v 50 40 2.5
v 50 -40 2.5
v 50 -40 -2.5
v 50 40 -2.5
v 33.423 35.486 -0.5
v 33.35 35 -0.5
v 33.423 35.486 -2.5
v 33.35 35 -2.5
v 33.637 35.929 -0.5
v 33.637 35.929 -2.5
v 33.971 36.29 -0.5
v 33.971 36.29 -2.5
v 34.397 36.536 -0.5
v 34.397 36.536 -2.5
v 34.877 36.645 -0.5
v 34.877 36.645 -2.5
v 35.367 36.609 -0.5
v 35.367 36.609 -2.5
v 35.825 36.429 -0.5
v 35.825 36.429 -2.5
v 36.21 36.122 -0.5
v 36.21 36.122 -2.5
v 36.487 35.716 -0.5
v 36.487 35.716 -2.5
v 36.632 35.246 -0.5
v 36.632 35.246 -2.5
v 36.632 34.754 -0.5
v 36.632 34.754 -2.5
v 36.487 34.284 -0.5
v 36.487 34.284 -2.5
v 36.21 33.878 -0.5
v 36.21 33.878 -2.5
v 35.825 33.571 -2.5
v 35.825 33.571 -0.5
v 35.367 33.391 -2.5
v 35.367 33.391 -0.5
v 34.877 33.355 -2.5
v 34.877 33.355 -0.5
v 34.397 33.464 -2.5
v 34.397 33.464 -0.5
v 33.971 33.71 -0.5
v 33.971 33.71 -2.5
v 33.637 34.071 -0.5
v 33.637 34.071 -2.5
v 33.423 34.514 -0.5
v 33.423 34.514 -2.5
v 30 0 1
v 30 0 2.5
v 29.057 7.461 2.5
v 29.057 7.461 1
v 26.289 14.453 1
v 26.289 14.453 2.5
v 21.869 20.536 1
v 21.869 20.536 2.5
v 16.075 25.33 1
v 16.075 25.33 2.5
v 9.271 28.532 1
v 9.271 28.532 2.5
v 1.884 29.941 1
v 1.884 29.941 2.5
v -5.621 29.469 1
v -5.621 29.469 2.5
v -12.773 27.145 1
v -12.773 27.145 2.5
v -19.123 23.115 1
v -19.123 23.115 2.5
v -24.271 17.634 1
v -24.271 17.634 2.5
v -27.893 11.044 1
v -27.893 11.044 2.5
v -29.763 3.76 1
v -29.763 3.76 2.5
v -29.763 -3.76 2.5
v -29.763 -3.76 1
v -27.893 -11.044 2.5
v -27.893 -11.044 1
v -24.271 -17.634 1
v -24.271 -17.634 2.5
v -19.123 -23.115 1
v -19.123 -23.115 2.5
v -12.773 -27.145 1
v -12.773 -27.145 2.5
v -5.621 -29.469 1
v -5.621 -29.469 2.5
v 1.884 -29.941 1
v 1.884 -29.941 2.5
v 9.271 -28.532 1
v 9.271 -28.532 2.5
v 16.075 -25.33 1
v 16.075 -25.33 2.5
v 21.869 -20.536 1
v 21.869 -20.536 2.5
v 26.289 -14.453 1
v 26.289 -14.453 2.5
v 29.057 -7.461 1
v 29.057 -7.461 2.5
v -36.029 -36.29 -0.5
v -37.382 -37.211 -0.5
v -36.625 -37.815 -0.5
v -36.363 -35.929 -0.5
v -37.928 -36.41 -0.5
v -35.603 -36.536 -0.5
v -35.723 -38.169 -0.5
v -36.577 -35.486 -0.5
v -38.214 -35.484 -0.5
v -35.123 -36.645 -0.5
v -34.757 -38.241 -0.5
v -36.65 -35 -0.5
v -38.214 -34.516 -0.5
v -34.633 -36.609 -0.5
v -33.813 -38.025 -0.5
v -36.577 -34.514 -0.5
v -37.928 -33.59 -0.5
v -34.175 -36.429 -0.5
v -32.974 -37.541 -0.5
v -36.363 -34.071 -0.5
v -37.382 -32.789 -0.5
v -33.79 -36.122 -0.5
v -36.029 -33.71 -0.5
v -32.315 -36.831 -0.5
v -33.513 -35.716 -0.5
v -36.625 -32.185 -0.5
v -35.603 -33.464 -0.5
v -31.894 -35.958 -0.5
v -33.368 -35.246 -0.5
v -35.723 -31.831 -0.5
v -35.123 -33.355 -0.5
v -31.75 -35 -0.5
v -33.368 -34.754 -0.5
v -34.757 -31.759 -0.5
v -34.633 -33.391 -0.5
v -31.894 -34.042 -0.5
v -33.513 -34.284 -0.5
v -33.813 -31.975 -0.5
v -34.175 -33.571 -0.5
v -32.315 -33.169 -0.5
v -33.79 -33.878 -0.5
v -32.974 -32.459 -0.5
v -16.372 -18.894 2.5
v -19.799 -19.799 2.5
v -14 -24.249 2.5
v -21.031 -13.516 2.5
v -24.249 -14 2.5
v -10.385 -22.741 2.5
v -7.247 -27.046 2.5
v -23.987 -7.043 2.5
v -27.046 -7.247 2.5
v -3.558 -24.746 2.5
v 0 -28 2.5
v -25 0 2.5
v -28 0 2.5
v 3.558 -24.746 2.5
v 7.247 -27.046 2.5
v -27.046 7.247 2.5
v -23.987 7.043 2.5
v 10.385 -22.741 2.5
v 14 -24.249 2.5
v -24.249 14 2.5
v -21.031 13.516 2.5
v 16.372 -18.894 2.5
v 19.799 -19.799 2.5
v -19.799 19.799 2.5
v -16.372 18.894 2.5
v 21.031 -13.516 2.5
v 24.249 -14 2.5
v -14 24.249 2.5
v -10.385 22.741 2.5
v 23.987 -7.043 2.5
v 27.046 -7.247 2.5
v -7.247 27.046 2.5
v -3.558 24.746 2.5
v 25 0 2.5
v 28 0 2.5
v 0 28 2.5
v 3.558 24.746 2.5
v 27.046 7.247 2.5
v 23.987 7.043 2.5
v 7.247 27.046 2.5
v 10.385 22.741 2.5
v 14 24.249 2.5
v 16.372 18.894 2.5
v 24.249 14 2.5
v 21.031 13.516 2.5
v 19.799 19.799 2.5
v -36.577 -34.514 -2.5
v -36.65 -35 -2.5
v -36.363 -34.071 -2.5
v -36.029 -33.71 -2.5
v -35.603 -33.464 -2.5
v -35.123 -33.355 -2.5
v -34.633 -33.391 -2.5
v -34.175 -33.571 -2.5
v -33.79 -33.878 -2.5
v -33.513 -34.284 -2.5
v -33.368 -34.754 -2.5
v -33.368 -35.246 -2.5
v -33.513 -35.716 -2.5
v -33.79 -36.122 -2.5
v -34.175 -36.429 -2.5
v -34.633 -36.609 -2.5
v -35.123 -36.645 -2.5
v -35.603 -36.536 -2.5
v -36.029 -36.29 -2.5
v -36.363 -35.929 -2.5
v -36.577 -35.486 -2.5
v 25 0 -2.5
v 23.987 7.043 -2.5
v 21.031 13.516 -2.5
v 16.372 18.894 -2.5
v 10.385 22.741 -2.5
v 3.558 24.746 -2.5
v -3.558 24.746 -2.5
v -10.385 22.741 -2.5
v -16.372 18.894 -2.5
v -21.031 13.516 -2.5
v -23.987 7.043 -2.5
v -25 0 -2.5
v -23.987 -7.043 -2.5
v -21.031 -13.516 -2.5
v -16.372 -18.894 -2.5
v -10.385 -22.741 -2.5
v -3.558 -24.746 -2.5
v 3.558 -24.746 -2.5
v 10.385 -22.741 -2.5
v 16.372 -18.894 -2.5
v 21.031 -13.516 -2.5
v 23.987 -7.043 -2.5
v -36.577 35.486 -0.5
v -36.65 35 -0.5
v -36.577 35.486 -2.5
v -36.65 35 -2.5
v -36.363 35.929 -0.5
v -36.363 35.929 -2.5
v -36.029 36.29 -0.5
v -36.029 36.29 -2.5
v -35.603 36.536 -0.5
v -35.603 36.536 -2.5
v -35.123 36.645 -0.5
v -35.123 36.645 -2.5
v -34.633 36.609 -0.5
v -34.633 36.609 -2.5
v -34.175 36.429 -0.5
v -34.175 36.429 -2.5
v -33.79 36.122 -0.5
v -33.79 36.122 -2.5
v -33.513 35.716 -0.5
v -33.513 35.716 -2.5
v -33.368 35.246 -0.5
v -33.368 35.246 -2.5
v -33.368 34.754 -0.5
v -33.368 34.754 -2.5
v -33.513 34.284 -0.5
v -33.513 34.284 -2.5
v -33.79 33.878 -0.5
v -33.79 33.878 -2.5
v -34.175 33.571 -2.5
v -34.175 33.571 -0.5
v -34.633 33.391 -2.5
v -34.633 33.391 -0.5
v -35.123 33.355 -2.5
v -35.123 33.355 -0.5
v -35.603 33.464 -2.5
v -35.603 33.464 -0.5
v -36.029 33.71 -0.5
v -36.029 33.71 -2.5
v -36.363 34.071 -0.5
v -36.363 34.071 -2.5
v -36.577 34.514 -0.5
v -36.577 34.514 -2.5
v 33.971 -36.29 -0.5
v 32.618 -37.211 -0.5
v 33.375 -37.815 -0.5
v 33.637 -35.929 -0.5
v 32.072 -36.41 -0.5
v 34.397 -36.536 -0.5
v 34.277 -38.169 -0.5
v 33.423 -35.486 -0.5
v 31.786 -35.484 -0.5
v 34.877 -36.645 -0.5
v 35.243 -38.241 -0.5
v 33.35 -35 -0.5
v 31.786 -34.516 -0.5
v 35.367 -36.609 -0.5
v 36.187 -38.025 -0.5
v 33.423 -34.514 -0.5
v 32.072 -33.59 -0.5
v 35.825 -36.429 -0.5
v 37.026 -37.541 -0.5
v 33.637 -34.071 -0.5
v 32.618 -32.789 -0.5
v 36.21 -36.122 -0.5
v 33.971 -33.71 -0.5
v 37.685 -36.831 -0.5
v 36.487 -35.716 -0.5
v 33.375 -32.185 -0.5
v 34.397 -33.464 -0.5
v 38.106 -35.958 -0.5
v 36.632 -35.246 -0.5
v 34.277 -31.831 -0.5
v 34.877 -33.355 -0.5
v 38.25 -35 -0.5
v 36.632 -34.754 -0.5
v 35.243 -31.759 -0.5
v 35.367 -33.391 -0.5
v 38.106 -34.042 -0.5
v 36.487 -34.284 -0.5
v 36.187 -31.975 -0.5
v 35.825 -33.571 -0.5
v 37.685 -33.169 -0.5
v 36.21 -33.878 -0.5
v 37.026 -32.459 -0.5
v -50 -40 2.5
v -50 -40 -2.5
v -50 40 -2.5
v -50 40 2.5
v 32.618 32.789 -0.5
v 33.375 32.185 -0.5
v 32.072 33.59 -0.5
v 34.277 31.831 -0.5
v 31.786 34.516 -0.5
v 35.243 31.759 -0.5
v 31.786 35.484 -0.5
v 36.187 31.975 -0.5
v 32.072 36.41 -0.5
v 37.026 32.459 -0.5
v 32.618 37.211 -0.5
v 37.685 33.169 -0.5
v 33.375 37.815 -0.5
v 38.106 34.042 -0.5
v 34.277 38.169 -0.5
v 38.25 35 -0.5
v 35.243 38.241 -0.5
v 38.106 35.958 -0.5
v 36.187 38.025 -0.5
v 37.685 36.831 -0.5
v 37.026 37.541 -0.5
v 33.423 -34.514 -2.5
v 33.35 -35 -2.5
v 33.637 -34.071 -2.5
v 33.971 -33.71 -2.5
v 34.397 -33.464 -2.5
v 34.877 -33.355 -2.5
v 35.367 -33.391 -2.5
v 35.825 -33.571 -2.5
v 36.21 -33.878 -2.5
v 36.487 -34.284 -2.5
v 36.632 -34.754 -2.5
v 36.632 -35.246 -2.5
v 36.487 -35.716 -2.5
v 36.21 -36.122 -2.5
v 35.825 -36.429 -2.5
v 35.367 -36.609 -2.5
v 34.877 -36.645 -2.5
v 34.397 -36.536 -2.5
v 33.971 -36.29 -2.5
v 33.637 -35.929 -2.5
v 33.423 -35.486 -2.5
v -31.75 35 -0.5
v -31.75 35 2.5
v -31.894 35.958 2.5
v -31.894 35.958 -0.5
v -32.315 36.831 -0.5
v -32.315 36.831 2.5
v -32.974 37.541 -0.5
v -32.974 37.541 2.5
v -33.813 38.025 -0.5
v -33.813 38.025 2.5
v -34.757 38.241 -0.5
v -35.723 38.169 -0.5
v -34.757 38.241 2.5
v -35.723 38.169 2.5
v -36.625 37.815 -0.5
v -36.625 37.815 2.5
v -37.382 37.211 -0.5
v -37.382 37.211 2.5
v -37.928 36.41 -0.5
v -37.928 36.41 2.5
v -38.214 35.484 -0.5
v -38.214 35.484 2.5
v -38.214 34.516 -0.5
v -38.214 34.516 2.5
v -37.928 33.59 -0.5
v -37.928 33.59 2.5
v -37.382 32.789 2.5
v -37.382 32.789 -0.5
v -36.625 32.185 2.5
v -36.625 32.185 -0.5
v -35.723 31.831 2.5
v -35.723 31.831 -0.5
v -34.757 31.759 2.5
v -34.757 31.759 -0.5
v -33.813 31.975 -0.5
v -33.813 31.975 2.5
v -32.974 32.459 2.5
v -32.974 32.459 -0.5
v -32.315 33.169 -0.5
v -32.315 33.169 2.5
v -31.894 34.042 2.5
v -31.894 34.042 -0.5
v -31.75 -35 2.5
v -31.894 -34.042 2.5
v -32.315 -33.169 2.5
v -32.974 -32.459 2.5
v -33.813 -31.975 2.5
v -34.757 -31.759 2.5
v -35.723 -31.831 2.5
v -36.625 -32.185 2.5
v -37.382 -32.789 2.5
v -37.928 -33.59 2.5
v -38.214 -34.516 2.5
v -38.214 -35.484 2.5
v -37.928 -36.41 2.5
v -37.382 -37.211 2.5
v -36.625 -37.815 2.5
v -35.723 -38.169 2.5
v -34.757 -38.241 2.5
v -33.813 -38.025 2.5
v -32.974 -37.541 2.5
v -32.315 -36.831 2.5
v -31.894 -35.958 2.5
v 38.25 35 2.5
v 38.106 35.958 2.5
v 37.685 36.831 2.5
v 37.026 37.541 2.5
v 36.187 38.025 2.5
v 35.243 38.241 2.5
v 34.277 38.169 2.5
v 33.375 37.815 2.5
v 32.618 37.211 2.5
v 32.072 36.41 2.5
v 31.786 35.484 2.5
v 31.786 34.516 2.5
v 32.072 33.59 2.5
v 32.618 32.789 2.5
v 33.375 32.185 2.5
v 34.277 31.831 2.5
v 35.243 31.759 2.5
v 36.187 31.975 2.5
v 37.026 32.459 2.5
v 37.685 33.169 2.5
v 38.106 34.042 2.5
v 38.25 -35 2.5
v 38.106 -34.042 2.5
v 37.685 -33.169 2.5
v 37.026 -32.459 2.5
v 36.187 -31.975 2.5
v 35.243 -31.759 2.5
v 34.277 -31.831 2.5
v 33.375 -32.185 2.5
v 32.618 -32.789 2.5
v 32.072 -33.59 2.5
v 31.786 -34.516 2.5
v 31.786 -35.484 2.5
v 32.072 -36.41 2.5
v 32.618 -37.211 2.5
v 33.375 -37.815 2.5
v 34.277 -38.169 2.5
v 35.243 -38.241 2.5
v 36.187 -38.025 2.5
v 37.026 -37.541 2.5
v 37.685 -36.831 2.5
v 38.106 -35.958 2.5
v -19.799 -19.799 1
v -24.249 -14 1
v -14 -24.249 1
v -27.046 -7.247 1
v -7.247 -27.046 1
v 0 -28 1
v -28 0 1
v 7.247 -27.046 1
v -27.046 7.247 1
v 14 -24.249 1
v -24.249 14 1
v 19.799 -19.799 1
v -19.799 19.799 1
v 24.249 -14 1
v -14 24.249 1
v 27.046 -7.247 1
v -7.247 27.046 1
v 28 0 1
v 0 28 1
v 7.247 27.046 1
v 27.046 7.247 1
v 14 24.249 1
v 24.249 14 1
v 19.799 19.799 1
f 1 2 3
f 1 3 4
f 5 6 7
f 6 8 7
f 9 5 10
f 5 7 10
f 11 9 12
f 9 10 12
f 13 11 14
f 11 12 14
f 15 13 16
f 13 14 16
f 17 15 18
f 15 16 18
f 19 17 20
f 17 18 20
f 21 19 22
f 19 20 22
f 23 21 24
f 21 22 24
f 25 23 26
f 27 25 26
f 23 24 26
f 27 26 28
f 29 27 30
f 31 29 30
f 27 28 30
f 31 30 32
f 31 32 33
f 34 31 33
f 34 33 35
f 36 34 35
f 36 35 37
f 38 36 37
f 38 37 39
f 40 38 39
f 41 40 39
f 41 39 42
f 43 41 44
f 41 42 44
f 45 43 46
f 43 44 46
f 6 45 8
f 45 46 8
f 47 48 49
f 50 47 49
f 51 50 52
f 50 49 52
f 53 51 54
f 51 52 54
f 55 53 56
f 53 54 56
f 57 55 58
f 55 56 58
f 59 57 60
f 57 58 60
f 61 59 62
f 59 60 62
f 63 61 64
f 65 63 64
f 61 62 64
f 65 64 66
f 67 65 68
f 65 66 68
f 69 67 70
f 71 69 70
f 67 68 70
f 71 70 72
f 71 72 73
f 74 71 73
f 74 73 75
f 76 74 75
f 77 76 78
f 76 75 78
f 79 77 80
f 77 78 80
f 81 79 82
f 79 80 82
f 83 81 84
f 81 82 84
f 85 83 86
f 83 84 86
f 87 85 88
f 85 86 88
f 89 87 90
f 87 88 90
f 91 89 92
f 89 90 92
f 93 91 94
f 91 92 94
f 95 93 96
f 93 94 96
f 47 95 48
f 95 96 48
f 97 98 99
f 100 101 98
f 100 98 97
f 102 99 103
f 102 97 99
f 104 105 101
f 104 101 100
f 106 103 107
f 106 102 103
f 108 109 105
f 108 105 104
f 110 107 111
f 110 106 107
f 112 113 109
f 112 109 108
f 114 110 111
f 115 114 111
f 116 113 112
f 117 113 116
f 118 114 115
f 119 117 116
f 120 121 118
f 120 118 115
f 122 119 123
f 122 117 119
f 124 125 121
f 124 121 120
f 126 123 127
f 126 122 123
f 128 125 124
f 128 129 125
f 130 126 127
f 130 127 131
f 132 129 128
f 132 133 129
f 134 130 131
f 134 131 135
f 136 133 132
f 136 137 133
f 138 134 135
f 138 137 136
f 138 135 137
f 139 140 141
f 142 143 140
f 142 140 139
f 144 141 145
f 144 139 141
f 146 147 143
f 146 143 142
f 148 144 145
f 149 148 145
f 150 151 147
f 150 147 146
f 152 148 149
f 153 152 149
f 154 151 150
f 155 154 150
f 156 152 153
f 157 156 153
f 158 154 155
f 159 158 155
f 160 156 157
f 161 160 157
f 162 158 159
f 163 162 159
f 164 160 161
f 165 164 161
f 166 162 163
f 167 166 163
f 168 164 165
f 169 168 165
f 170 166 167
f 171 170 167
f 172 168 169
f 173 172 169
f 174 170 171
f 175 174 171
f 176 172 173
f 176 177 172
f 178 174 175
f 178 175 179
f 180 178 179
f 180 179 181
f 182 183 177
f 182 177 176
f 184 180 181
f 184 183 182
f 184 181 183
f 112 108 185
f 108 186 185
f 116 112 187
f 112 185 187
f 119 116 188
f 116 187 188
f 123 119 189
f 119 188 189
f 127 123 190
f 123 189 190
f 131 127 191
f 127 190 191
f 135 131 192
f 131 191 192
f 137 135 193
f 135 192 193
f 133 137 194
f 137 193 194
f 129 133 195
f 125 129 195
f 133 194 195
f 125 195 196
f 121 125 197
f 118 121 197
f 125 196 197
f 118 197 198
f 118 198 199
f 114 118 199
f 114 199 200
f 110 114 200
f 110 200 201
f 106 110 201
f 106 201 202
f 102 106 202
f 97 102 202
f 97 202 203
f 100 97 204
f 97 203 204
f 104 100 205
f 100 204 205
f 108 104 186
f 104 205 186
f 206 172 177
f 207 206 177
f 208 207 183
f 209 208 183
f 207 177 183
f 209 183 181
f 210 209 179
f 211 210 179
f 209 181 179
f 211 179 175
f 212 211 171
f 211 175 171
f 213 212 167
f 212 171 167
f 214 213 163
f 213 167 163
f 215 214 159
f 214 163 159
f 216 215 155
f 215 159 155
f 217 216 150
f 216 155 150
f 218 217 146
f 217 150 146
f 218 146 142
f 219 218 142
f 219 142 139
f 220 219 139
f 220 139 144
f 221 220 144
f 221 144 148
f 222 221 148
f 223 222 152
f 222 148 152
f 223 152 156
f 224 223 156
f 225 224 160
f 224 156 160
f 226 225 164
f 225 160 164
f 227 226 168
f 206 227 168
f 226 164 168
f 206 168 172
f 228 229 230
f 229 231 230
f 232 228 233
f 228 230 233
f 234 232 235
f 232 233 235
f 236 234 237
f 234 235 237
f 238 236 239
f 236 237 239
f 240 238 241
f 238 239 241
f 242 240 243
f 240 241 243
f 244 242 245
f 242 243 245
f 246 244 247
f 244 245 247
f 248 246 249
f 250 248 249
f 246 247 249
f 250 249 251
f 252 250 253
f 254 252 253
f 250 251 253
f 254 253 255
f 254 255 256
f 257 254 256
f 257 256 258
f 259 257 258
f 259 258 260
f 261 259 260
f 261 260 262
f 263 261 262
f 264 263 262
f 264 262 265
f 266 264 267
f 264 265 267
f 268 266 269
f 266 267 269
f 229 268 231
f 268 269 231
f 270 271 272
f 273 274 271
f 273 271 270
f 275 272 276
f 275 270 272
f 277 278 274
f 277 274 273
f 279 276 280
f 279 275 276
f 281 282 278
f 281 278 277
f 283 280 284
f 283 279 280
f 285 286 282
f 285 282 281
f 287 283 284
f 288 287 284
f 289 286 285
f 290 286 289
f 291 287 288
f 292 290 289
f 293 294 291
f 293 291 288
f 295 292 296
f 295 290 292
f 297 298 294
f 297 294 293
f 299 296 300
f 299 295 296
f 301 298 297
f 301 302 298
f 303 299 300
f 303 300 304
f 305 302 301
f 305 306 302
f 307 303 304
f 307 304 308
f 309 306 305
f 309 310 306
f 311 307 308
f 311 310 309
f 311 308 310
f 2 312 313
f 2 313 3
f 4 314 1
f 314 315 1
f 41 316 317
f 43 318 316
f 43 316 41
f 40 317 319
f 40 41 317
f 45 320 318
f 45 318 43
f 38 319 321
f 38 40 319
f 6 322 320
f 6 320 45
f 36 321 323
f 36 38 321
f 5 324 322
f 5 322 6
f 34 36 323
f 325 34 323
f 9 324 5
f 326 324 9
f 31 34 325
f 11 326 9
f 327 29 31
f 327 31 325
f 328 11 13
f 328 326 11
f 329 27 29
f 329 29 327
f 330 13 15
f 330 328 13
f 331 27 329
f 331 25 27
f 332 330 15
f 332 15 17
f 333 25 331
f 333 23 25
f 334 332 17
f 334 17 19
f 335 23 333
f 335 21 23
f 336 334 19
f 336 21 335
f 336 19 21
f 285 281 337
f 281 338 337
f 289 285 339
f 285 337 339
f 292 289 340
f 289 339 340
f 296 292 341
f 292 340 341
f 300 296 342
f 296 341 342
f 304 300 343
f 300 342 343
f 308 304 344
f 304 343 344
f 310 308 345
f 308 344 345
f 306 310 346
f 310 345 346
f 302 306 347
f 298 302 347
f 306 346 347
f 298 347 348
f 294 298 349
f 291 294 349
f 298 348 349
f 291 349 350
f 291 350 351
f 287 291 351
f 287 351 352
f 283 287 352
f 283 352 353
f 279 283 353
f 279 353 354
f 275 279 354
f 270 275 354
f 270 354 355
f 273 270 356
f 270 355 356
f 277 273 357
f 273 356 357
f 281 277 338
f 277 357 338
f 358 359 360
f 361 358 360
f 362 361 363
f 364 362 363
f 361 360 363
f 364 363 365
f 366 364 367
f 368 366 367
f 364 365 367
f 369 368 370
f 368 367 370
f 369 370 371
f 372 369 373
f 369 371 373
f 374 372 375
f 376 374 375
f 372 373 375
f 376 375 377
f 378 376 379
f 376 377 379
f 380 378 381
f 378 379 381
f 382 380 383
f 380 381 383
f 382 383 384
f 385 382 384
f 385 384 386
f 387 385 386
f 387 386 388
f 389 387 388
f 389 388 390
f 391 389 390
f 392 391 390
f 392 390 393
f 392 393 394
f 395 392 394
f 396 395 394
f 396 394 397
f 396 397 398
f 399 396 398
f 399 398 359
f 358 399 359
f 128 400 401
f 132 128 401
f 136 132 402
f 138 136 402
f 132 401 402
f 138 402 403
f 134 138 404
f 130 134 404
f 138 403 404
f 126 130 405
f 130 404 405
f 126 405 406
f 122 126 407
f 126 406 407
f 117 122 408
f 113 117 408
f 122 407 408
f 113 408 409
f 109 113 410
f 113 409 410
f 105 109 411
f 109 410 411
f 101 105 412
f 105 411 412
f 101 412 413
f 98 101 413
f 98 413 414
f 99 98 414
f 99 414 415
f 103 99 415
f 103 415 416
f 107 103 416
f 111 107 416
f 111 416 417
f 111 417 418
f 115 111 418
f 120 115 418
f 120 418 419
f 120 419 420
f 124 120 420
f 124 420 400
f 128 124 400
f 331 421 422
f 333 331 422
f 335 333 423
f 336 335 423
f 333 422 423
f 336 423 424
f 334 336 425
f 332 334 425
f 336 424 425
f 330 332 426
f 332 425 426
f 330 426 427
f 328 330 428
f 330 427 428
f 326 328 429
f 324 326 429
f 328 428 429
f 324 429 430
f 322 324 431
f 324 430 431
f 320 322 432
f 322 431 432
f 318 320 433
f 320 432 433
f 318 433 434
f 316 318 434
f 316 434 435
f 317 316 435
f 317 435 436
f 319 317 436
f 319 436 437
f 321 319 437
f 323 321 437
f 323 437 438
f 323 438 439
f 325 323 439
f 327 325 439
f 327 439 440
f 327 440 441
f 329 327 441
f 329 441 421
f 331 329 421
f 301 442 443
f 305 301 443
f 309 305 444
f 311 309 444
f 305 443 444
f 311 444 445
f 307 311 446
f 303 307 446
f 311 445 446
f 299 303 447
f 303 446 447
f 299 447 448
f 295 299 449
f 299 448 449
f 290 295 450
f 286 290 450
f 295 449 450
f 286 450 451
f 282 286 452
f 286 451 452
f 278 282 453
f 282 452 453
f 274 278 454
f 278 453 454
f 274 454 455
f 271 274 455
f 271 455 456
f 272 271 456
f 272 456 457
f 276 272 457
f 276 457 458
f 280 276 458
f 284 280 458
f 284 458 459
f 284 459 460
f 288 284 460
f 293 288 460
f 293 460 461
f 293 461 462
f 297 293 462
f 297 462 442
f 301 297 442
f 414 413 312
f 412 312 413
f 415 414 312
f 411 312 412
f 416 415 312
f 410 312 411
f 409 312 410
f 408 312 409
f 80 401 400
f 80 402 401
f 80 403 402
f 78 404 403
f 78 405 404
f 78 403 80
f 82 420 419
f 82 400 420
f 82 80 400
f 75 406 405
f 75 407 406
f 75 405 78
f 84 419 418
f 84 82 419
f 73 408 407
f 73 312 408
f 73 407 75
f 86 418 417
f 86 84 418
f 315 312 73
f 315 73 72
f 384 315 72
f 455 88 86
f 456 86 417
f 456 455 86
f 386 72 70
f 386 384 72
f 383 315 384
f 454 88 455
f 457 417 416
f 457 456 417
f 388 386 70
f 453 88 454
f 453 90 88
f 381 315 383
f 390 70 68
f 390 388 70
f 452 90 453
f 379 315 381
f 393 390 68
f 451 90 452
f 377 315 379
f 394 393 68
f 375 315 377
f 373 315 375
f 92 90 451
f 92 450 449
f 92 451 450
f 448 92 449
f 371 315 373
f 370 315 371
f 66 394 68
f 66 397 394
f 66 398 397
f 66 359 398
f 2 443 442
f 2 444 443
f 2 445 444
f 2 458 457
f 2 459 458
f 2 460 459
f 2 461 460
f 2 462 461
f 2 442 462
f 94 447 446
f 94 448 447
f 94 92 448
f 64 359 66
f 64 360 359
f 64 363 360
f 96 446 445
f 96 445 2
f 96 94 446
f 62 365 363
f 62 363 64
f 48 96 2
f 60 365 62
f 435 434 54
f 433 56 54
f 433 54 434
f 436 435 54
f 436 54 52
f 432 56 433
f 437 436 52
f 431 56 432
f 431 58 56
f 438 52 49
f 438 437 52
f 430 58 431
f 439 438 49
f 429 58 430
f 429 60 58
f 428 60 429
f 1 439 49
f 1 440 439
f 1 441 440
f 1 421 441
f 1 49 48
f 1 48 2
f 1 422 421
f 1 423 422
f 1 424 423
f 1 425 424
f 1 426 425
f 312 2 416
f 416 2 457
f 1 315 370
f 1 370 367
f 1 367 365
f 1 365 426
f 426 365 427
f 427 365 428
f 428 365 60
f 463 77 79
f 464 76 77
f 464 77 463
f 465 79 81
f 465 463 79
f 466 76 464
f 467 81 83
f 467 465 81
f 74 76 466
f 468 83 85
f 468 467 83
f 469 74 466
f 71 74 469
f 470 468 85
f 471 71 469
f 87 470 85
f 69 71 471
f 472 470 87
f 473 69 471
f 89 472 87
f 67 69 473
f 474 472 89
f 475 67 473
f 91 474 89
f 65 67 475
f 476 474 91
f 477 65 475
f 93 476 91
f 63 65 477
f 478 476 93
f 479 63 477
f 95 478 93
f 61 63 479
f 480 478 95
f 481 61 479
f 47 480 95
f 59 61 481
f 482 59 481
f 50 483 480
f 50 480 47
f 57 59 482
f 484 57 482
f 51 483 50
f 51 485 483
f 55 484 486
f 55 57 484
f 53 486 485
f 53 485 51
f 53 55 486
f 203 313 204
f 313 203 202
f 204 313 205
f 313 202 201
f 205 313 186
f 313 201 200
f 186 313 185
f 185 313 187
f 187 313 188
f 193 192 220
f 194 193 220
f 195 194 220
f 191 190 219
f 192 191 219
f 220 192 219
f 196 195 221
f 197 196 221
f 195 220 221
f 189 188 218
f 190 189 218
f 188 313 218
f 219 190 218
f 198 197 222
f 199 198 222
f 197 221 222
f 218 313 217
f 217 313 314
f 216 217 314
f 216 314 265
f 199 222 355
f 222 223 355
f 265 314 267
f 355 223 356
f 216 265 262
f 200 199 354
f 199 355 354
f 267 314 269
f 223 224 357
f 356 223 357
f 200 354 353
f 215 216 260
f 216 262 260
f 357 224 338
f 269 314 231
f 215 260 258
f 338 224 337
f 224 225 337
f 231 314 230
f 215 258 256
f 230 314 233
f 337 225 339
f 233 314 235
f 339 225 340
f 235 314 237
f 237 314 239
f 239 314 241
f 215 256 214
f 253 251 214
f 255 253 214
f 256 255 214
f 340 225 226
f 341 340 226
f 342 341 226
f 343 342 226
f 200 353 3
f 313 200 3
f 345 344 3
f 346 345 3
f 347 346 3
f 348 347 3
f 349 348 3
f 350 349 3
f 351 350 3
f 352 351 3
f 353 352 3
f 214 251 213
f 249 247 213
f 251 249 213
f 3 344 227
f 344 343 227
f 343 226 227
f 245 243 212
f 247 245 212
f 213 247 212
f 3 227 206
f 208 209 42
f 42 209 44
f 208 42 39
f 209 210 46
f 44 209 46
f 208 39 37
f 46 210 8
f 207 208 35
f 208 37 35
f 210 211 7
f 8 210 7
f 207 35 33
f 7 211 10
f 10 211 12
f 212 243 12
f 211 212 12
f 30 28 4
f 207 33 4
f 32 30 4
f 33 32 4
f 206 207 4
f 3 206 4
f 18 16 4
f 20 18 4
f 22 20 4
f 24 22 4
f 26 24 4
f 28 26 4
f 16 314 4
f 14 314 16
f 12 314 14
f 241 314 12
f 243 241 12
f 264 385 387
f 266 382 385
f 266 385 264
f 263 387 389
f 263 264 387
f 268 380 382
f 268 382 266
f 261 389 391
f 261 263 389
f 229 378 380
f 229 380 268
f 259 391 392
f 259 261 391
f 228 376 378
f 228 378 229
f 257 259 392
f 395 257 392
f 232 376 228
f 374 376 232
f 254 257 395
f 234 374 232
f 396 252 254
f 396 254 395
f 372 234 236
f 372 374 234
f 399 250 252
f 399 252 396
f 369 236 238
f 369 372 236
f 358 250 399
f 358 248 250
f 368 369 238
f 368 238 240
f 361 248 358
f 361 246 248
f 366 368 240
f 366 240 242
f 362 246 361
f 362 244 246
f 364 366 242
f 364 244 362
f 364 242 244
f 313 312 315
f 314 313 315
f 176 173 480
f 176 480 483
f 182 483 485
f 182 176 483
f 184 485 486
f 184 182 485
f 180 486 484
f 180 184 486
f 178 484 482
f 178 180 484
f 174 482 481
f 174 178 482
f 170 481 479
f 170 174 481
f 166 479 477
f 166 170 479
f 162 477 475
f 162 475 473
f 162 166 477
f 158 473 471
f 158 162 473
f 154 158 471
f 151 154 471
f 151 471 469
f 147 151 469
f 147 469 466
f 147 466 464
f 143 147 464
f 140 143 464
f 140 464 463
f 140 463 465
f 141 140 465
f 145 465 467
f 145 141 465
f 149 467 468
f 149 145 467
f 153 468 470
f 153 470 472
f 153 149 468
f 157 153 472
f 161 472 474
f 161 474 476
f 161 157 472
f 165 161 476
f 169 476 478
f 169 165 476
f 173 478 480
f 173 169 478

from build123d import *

# Parameters (mm, degrees)
F0_W           = 100
F0_H           = 80
F1_DEPTH       = 2.5
F2_R           = 25
F3_DEPTH       = 5
F4_R           = 30
F4_R_2         = 28
F5_DEPTH       = 1.5
F7_D           = 3.3
F7_CBORE_D     = 6.5
F7_CBORE_DEPTH = 3


with BuildPart() as f1:
    # F0 (on Top) → F1 (new body, symmetric)
    with BuildSketch(Plane.XY):
        Rectangle(F0_W, F0_H)
    extrude(amount=F1_DEPTH, both=True)

    # F2 (on face) → F3 (cut, through all)
    with BuildSketch(Plane.XY.offset(2.5)):
        Circle(F2_R)
    extrude(amount=-F3_DEPTH, mode=Mode.SUBTRACT)

    # F4 (on face) → F5 (cut)
    with BuildSketch(Plane.XY.offset(2.5)):
        Circle(F4_R)
        Circle(F4_R_2, mode=Mode.SUBTRACT)
    extrude(amount=-F5_DEPTH, mode=Mode.SUBTRACT)

    # F7 (through all)
    with Locations(Plane.XY.offset(2.5)):
        with Locations((-35, 35), (35, 35), (35, -35), (-35, -35)):
            CounterBoreHole(F7_D / 2, F7_CBORE_D / 2, F7_CBORE_DEPTH)


solid = f1.part
